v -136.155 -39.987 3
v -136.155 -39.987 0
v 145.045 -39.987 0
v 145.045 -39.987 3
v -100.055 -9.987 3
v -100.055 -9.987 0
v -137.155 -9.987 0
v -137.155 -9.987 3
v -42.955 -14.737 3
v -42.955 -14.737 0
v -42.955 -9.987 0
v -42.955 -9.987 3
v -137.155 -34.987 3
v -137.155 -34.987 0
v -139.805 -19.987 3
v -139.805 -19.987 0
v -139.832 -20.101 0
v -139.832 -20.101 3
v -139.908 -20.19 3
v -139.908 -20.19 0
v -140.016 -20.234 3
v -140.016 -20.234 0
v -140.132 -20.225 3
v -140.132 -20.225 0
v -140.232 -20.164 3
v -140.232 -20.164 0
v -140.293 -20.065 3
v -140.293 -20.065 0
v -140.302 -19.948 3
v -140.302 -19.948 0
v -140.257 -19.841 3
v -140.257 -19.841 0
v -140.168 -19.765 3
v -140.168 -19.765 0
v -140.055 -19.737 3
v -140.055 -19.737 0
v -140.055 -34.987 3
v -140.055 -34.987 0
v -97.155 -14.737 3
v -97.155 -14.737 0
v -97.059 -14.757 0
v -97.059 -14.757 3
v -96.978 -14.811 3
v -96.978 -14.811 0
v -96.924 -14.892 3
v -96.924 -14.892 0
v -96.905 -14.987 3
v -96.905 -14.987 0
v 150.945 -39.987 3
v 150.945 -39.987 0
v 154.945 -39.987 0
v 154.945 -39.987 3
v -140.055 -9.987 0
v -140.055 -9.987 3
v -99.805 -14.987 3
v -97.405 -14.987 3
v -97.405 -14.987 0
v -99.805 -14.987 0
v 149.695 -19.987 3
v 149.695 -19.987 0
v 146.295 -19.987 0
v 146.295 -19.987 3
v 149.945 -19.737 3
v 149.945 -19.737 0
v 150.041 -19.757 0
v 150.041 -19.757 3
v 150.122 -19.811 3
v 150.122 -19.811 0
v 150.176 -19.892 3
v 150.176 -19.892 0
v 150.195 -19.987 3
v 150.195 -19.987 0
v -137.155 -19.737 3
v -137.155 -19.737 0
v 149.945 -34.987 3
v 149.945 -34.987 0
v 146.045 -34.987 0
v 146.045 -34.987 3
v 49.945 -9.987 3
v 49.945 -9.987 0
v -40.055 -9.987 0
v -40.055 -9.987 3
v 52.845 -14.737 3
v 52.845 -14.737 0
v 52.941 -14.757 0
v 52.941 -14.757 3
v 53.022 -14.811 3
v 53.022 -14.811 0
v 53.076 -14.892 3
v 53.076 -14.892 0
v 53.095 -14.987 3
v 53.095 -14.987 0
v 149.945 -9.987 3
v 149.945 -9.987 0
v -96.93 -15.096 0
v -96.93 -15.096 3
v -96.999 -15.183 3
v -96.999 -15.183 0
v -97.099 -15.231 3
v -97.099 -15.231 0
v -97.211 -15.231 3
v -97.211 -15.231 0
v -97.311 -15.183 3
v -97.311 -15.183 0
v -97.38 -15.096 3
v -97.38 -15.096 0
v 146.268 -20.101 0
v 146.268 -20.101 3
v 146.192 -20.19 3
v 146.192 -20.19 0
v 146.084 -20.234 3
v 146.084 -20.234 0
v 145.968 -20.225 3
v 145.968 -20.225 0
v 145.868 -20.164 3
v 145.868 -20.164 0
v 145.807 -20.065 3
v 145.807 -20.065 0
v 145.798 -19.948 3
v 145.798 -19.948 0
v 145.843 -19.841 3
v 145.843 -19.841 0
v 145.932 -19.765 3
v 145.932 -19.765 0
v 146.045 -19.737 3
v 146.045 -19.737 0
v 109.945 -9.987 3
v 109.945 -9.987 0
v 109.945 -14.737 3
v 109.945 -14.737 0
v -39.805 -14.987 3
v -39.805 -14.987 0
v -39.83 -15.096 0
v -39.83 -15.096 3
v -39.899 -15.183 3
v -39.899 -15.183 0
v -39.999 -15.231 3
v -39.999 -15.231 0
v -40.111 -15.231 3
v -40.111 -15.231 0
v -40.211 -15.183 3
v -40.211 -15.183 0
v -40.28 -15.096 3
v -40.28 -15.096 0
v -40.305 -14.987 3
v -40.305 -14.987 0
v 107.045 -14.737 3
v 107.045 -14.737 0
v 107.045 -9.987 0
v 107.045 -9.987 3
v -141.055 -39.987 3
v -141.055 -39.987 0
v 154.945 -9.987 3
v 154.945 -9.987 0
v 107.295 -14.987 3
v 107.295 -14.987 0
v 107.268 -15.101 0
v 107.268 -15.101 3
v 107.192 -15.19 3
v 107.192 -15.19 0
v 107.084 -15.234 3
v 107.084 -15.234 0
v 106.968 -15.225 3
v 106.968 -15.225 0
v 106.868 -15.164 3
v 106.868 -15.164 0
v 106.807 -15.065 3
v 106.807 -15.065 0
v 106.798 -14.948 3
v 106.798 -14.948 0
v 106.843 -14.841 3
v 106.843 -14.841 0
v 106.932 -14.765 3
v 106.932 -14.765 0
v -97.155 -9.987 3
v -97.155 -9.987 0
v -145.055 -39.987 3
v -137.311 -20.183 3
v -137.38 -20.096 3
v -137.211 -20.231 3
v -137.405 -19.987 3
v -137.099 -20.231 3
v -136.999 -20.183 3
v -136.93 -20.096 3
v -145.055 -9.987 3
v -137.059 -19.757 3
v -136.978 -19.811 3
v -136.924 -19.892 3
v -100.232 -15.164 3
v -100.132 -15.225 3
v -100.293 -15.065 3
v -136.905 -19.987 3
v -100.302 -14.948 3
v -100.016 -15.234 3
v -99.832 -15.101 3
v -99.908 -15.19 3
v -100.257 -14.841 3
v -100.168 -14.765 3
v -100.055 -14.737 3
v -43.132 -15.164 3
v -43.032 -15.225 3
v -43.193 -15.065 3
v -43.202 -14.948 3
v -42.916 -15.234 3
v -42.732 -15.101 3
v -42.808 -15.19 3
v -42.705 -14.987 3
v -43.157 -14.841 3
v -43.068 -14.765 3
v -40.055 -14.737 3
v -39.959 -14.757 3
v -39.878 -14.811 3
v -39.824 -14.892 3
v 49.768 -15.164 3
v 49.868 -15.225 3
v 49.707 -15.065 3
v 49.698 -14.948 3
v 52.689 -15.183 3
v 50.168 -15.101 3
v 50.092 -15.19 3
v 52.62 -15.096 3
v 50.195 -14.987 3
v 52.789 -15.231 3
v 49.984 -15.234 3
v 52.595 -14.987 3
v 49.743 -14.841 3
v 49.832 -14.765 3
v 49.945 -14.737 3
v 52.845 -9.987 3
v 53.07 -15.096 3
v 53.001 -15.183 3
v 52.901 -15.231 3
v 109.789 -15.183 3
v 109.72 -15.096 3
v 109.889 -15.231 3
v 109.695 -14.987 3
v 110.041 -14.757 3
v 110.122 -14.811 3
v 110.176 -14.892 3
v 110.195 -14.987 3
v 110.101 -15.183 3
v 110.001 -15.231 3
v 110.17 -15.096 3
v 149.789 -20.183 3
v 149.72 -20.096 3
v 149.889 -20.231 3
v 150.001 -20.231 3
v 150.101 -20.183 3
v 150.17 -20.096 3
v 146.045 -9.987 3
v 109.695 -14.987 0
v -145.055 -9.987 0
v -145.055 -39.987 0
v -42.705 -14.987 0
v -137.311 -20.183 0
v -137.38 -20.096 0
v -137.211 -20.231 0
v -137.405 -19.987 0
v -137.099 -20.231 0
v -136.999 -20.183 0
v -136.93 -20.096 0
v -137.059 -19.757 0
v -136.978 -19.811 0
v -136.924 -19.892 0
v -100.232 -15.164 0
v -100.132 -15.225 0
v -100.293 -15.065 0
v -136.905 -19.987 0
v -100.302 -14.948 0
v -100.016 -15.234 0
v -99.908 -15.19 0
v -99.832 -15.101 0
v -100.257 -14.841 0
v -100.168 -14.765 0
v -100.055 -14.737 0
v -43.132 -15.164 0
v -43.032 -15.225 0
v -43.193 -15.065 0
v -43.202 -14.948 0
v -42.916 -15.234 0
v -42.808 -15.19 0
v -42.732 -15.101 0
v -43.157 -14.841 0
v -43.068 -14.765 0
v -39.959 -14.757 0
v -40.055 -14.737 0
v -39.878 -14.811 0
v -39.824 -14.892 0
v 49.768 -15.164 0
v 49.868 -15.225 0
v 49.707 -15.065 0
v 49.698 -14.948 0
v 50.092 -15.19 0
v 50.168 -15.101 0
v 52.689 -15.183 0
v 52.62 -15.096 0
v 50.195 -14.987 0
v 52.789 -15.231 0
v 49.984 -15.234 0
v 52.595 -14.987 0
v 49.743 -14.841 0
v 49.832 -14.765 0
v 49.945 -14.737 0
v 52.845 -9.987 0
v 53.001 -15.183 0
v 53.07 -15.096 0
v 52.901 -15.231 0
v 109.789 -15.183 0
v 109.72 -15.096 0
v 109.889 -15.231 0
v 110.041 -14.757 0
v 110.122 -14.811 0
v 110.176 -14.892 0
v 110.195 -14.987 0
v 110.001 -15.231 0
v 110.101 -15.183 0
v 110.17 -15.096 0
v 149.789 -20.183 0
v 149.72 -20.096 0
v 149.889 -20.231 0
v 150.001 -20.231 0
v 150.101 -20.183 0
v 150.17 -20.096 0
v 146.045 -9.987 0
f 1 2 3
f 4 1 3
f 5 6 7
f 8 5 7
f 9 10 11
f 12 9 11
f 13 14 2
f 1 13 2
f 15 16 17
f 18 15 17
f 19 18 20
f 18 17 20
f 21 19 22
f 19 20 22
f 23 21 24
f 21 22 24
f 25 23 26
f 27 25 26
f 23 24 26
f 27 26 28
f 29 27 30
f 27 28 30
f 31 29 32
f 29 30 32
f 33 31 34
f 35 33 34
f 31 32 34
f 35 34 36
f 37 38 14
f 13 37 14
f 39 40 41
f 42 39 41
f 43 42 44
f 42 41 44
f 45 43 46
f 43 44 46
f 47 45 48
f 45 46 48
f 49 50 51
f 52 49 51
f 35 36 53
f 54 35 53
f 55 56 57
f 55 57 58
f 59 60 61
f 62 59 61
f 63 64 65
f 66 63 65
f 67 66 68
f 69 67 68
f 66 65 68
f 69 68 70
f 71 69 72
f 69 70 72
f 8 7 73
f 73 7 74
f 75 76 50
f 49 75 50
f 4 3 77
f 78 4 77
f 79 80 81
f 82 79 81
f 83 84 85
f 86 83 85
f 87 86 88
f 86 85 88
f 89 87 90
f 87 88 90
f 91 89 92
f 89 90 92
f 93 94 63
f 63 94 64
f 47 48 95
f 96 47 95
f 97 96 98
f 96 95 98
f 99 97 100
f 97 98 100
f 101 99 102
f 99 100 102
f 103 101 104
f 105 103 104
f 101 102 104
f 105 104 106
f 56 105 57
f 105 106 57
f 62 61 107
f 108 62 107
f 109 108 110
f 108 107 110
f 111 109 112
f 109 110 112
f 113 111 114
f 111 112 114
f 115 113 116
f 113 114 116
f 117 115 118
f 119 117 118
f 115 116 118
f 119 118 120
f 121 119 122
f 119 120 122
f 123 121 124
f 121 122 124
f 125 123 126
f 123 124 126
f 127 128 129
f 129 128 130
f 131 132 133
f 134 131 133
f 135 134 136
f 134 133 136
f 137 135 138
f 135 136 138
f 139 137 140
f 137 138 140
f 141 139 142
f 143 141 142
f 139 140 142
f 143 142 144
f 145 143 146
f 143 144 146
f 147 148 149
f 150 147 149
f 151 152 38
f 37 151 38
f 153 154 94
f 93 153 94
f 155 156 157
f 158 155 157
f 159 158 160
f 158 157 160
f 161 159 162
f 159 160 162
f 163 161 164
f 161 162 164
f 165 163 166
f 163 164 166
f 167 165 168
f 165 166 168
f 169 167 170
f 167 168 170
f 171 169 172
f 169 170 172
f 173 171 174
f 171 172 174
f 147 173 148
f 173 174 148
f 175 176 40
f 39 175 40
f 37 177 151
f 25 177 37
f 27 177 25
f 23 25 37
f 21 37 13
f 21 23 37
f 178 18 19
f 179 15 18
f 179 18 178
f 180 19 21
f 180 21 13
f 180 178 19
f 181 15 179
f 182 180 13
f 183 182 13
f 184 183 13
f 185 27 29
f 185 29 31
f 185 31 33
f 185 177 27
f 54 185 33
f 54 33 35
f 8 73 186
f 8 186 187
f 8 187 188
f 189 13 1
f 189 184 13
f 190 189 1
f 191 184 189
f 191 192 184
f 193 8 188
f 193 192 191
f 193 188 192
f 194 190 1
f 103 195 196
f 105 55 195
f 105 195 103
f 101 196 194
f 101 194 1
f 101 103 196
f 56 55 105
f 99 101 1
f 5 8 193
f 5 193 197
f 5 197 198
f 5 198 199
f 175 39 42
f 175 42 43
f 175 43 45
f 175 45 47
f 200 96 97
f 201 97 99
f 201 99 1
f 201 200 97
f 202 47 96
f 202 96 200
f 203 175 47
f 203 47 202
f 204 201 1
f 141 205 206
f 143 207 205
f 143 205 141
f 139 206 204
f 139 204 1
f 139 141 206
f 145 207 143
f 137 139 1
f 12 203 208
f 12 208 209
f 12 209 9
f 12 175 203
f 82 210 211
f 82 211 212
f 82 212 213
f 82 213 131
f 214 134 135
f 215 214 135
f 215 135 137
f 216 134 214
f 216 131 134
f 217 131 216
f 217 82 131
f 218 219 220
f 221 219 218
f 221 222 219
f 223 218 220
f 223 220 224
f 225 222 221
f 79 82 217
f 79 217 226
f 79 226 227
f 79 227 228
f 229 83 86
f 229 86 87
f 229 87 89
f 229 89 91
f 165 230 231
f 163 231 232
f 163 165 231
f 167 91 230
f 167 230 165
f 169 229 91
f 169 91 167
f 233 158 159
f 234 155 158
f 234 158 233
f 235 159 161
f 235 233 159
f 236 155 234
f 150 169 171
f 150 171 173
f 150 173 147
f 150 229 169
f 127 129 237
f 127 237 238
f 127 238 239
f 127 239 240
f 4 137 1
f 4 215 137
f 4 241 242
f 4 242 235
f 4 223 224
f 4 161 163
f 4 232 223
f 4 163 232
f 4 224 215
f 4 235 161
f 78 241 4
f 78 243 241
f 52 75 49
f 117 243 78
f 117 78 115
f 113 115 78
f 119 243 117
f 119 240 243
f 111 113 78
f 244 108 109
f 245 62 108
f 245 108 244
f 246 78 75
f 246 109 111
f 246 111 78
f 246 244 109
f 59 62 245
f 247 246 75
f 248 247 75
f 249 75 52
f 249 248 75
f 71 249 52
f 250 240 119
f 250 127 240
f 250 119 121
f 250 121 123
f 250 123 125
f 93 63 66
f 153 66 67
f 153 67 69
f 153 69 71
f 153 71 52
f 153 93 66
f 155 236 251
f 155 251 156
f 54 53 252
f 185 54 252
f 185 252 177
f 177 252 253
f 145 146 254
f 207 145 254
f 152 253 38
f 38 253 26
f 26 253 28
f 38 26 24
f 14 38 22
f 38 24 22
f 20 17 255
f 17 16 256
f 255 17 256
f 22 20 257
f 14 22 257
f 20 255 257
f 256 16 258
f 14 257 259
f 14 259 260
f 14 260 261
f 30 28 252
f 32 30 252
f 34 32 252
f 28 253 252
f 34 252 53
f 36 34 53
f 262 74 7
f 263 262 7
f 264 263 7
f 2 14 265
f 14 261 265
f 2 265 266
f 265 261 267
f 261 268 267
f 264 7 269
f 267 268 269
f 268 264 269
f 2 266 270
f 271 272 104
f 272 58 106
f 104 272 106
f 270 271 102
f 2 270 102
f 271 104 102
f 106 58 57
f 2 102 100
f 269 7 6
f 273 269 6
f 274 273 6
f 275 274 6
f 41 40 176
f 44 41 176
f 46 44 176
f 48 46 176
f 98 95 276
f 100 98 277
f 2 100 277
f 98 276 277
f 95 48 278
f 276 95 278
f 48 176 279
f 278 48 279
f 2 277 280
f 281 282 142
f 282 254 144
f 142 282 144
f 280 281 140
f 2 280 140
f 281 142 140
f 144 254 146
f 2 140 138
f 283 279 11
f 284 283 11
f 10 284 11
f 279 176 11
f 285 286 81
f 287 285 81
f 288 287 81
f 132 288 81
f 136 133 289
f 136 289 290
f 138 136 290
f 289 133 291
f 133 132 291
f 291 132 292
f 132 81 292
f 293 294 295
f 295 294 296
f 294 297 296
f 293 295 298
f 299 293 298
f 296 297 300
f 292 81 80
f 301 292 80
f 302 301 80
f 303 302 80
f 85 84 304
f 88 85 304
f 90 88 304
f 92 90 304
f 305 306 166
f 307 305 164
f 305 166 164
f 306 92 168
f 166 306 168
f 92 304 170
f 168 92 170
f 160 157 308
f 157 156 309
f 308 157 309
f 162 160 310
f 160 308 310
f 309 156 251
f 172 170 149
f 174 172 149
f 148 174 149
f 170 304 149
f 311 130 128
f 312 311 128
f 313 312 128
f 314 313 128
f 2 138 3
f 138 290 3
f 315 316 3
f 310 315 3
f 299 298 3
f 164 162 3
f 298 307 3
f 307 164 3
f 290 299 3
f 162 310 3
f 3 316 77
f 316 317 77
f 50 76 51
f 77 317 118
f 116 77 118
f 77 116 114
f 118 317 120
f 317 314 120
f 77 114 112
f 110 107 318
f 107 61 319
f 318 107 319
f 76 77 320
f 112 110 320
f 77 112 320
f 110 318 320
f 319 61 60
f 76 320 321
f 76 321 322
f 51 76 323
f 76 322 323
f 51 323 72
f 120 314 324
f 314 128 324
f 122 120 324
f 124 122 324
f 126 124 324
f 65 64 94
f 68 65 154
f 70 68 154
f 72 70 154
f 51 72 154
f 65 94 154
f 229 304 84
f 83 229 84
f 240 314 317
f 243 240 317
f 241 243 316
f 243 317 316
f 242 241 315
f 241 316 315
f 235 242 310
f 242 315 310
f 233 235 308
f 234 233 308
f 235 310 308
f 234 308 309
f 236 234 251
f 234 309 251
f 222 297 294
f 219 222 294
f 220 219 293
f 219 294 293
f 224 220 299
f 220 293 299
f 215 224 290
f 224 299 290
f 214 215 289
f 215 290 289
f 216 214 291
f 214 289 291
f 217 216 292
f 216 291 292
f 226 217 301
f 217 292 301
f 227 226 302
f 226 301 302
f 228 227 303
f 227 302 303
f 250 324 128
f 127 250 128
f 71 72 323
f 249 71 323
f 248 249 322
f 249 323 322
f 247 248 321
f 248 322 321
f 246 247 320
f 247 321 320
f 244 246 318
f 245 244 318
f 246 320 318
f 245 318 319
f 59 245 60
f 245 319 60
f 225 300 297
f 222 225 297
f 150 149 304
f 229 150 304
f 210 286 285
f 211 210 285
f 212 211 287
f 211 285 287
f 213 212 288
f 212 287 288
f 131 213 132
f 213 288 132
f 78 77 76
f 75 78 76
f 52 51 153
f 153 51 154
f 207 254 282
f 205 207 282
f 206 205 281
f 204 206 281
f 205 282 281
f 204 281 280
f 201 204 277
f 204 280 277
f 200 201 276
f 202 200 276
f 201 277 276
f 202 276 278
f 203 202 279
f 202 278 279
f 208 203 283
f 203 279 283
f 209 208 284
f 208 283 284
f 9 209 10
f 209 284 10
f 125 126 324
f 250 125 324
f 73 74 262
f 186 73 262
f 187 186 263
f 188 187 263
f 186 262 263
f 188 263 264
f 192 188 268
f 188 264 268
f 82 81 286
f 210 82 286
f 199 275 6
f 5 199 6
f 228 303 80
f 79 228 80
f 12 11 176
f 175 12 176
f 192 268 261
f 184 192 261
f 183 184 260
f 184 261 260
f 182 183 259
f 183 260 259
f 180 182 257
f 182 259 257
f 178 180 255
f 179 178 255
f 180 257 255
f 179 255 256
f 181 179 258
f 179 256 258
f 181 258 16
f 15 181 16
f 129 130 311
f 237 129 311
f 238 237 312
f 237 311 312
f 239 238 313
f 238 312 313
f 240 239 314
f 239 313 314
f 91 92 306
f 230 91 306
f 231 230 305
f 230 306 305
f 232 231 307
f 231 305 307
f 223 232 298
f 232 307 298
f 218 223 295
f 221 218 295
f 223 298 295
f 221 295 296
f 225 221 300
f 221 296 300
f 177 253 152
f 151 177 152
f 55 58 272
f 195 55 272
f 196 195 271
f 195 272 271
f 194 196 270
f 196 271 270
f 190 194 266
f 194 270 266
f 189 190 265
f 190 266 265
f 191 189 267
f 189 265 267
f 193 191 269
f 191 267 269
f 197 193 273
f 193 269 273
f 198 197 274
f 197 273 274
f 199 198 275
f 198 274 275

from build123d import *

# Parameters (mm, degrees)
F1_DEPTH = 3


with BuildPart() as f1:
    # F0 (on Top) → F1 (new body)
    with BuildSketch(Plane.XY):
        with BuildLine():
            Line((-140.054987, -9.987472), (-145.054987, -9.987472))
            Line((-145.054987, -9.987472), (-145.054987, -39.987472))
            Line((-145.054987, -39.987472), (-141.054987, -39.987472))
            Line((-141.054987, -39.987472), (-140.054987, -34.987472))
            Line((-140.054987, -34.987472), (-137.154987, -34.987472))
            Line((-137.154987, -34.987472), (-136.154987, -39.987472))
            Line((-136.154987, -39.987472), (145.045013, -39.987472))
            Line((145.045013, -39.987472), (146.045013, -34.987472))
            Line((146.045013, -34.987472), (149.945013, -34.987472))
            Line((149.945013, -34.987472), (150.945013, -39.987472))
            Line((150.945013, -39.987472), (154.945013, -39.987472))
            Line((154.945013, -39.987472), (154.945013, -9.987472))
            Line((154.945013, -9.987472), (149.945013, -9.987472))
            Line((149.945013, -9.987472), (149.945013, -19.737472))
            ThreePointArc((149.945013, -19.737472), (150.121789, -19.810695), (150.195013, -19.987472))
            ThreePointArc((150.195013, -19.987472), (149.945013, -20.237472), (149.695013, -19.987472))
            Line((149.695013, -19.987472), (146.295013, -19.987472))
            ThreePointArc((146.295013, -19.987472), (145.868236, -20.164249), (146.045013, -19.737472))
            Line((146.045013, -19.737472), (146.045013, -9.987472))
            Line((146.045013, -9.987472), (109.945013, -9.987472))
            Line((109.945013, -9.987472), (109.945013, -14.737472))
            ThreePointArc((109.945013, -14.737472), (110.121789, -14.810695), (110.195013, -14.987472))
            ThreePointArc((110.195013, -14.987472), (109.945013, -15.237472), (109.695013, -14.987472))
            Line((109.695013, -14.987472), (107.295013, -14.987472))
            ThreePointArc((107.295013, -14.987472), (106.868236, -15.164249), (107.045013, -14.737472))
            Line((107.045013, -14.737472), (107.045013, -9.987472))
            Line((107.045013, -9.987472), (52.845013, -9.987472))
            Line((52.845013, -9.987472), (52.845013, -14.737472))
            ThreePointArc((52.845013, -14.737472), (53.021789, -14.810695), (53.095013, -14.987472))
            ThreePointArc((53.095013, -14.987472), (52.845013, -15.237472), (52.595013, -14.987472))
            Line((52.595013, -14.987472), (50.195013, -14.987472))
            ThreePointArc((50.195013, -14.987472), (49.768236, -15.164249), (49.945013, -14.737472))
            Line((49.945013, -14.737472), (49.945013, -9.987472))
            Line((49.945013, -9.987472), (-40.054987, -9.987472))
            Line((-40.054987, -9.987472), (-40.054987, -14.737472))
            ThreePointArc((-40.054987, -14.737472), (-39.878211, -14.810695), (-39.804987, -14.987472))
            ThreePointArc((-39.804987, -14.987472), (-40.054987, -15.237472), (-40.304987, -14.987472))
            Line((-40.304987, -14.987472), (-42.704987, -14.987472))
            ThreePointArc((-42.704987, -14.987472), (-43.131764, -15.164249), (-42.954987, -14.737472))
            Line((-42.954987, -14.737472), (-42.954987, -9.987472))
            Line((-42.954987, -9.987472), (-97.154987, -9.987472))
            Line((-97.154987, -9.987472), (-97.154987, -14.737472))
            ThreePointArc((-97.154987, -14.737472), (-96.978211, -14.810695), (-96.904987, -14.987472))
            ThreePointArc((-96.904987, -14.987472), (-97.154987, -15.237472), (-97.404987, -14.987472))
            Line((-97.404987, -14.987472), (-99.804987, -14.987472))
            ThreePointArc((-99.804987, -14.987472), (-100.231764, -15.164249), (-100.054987, -14.737472))
            Line((-100.054987, -14.737472), (-100.054987, -9.987472))
            Line((-100.054987, -9.987472), (-137.154987, -9.987472))
            Line((-137.154987, -9.987472), (-137.154987, -19.737472))
            ThreePointArc((-137.154987, -19.737472), (-136.978211, -19.810695), (-136.904987, -19.987472))
            ThreePointArc((-136.904987, -19.987472), (-137.154987, -20.237472), (-137.404987, -19.987472))
            Line((-137.404987, -19.987472), (-139.804987, -19.987472))
            ThreePointArc((-139.804987, -19.987472), (-140.231764, -20.164249), (-140.054987, -19.737472))
            Line((-140.054987, -19.737472), (-140.054987, -9.987472))
        make_face()
    extrude(amount=F1_DEPTH)


solid = f1.part
